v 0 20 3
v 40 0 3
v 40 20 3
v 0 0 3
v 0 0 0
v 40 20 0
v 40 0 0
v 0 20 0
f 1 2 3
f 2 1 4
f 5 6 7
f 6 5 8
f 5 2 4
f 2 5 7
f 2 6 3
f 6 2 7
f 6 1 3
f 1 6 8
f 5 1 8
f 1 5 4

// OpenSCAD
// file: ../params.scad
// A parameter that DOES reach a part file, so check_dependencies.py must report
// an edit class stronger than C1. Written because the checker had only a
// POSITIVE fixture (the change tree works) and no NEGATIVE one -- a check that
// can never report anything is indistinguishable from one that does not work,
// which is the "constant assertion" vacuity class in formal verification.
wall = 3;
height = 20;
// main file
// panel.scad reads 'wall' and is exported separately, so a change to 'wall'
// reaches a part file -- class C2, not C1.
include <../params.scad>
module panel() { cube([40, 20, wall]); }
panel();
